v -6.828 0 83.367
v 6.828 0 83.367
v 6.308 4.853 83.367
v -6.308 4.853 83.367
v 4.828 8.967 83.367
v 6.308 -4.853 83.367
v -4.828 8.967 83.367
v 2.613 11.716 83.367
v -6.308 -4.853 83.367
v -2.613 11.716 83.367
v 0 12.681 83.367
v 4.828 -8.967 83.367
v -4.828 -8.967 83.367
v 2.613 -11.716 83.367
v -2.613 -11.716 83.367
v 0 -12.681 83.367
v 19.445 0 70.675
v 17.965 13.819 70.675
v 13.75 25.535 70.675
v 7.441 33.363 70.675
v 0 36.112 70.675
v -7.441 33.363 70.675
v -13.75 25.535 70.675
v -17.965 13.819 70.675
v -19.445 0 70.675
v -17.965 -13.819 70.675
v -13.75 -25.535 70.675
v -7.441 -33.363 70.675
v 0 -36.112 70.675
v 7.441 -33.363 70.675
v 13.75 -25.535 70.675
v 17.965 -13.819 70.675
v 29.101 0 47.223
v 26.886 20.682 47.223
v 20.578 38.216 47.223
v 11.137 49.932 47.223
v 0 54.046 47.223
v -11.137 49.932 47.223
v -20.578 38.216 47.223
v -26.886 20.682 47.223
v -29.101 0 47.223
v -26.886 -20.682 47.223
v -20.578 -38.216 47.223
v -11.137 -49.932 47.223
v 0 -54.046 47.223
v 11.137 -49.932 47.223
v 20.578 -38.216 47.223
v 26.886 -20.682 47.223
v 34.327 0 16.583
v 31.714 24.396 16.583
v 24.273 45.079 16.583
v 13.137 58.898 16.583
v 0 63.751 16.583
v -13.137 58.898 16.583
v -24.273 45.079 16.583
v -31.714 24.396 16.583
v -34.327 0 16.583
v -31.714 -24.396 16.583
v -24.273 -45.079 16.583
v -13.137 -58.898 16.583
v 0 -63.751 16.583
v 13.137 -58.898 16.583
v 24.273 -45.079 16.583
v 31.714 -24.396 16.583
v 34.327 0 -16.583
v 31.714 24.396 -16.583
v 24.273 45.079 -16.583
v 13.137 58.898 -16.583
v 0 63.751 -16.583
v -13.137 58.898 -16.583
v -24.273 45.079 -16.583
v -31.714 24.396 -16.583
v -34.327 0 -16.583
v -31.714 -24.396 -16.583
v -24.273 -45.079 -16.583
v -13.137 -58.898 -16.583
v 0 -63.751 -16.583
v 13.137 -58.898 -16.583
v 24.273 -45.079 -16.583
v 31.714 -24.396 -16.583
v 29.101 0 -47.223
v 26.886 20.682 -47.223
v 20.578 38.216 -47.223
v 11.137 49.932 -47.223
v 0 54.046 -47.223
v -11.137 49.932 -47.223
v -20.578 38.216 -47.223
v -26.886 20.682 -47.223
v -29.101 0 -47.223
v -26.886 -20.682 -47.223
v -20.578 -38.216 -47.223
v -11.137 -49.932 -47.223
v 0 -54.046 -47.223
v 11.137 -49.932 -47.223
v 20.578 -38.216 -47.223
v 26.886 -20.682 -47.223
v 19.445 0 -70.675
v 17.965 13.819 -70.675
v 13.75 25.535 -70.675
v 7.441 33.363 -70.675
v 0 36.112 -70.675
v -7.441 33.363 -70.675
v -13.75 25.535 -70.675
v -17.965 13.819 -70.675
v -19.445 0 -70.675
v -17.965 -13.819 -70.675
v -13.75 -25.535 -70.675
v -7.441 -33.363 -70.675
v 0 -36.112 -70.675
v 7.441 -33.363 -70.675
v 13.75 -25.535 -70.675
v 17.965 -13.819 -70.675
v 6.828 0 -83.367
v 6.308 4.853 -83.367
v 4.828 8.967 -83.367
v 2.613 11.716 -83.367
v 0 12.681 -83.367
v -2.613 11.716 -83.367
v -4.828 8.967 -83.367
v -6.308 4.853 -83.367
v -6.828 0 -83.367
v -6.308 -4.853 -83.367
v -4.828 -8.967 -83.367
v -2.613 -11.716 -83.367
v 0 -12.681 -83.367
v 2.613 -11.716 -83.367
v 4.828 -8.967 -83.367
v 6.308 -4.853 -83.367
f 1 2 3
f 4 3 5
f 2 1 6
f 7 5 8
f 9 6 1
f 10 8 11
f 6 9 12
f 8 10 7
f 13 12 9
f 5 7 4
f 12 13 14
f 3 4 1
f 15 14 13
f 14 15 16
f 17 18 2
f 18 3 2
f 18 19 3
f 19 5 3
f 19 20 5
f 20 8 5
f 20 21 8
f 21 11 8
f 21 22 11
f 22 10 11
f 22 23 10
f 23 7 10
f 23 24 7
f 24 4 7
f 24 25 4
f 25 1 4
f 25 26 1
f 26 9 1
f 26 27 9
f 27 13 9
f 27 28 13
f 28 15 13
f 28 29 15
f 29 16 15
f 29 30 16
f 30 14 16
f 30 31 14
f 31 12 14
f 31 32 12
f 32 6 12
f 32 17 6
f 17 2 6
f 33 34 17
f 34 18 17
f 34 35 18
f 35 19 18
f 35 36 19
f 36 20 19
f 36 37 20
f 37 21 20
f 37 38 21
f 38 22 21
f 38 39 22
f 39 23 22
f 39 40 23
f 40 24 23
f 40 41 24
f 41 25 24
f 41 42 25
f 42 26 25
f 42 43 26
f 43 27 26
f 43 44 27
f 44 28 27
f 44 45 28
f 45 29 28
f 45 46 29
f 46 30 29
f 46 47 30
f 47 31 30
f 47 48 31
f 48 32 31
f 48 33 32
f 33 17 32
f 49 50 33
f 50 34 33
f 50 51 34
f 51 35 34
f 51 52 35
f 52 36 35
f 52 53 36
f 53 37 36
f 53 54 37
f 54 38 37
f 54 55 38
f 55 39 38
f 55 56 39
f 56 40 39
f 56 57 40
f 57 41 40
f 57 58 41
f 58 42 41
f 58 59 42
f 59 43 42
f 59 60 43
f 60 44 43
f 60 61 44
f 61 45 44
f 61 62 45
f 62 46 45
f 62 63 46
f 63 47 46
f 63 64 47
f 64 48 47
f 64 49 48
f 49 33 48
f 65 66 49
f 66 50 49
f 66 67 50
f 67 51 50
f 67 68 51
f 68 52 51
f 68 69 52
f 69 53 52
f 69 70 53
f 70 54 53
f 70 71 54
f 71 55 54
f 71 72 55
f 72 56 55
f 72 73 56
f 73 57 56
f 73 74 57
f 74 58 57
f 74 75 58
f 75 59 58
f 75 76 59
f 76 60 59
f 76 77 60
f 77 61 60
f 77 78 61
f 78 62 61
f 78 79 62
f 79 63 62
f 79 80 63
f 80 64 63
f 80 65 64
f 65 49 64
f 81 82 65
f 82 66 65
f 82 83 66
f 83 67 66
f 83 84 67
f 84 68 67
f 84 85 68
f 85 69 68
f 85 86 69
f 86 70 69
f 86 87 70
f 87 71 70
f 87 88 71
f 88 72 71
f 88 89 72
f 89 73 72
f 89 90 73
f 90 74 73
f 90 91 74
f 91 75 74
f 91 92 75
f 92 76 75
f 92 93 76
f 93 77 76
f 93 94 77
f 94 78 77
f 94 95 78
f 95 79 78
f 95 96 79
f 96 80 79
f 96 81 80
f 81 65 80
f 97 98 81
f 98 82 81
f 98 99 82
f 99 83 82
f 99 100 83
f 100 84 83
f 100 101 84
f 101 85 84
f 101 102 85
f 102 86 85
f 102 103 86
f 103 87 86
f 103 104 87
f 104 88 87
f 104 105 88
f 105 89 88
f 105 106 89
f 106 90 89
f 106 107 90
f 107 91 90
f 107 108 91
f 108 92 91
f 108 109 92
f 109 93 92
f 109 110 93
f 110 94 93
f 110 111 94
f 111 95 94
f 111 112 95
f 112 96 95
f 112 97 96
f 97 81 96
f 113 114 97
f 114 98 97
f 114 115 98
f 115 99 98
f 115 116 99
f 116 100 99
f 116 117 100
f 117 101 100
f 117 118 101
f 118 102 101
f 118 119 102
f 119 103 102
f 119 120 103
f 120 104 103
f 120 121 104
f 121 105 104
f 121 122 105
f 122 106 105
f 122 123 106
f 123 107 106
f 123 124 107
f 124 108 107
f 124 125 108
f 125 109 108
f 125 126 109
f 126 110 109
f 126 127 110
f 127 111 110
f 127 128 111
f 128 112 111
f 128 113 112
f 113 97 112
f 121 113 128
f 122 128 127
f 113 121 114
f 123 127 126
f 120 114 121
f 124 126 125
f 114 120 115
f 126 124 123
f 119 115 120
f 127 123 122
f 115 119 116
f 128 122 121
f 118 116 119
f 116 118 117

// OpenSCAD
// Generated by SolidPython 1.0.1 on 2020-07-29 00:46:47


scale(v = [7, 13, 17]) {
	sphere(r = 5);
}
/***********************************************
*********      SolidPython code:      **********
************************************************
 
# import packages: SolidPython
from solid import *
from solid.utils import *
from itertools import chain, combinations, permutations


class Resize:

    def __init__(self, scad_file):
        self.scad_file = scad_file
        #self.scad_file = import_scad(scad_file)
        # cone/cylinder param:
        self.r1 = 0
        self.r2 = 0
        self.h = 0
        # rectangular prism param:
        self.w = 0
        self.l = 0
        # ellipse param:
        self.r = 0

    # import OpenScad code (file name corresponds to shape)


    # classify shape + parameters
    def assign(self, param1, param2, param3):
        if self.scad_file == 'cone.scad':
            self.r1 = param1
            self.r2 = param2
            self.h = param3
        elif self.scad_file == 'cylinder.scad':
            self.r1 = param1
            self.r2 = param2
            self.h = param3
        elif self.scad_file == 'rectangularPrism.scad':
            self.h = param1
            self.l = param2
            self.w = param3
        else:
            self.r = param1
            self.h = param2

    # resize parameters
    def iterate(self):
        x = range(3, 20, 2)
        i = 1
        if self.scad_file == 'cone.scad':
            tempList = list(permutations(x, 2))
            for temp in tempList:
                param1 = temp[0]
                param2 = temp[1]
                filepath = 'produced_scad_files/' + 'cone' + str(param1) + '_' + str(param2) + '_' + '.scad'
                scad_render_to_file(cylinder(h=param1, r1=param2, r2=0), filepath)

        elif self.scad_file == 'cylinder.scad':
            tempList = list(permutations(x, 3))
            for temp in tempList:
                param1 = temp[0]
                param2 = temp[1]
                filepath = 'produced_scad_files/' + 'cylinder' + str(param1) + '_' + str(param2) + '_' + '.scad'
                scad_render_to_file(cylinder(h=param1, r1=param2, r2=param2), filepath)

        elif self.scad_file == 'rectangularPrism.scad':
            tempList = list(permutations(x, 3))
            for temp in tempList:
                param1 = temp[0]
                param2 = temp[1]
                param3 = temp[2]
                filepath = 'produced_scad_files/' + 'rectangularPrism' + str(param1) + '_' + str(param2) + '_' + str(
                    param3) + '.scad'
                scad_render_to_file(cube(size=(param1, param2, param3)), filepath)

        elif self.scad_file == 'ellipse.scad':
            tempList = list(permutations(x, 4))
            for temp in tempList:
                param1 = temp[0]
                param2 = temp[1]
                param3 = temp[2]
                param4 = temp[3]
                filepath = 'produced_scad_files/' + 'ellipse' + str(param1) + '_' + str(param2) + '_' + str(param3) + '_' + str(param4) + '.scad'
                scad_render_to_file(scale([param1, param2, param3])(sphere(r=param4)), filepath)

    def render_to_scadfile(self):
        scad_render_to_file(scad, 'example.scad') 
 
************************************************/
